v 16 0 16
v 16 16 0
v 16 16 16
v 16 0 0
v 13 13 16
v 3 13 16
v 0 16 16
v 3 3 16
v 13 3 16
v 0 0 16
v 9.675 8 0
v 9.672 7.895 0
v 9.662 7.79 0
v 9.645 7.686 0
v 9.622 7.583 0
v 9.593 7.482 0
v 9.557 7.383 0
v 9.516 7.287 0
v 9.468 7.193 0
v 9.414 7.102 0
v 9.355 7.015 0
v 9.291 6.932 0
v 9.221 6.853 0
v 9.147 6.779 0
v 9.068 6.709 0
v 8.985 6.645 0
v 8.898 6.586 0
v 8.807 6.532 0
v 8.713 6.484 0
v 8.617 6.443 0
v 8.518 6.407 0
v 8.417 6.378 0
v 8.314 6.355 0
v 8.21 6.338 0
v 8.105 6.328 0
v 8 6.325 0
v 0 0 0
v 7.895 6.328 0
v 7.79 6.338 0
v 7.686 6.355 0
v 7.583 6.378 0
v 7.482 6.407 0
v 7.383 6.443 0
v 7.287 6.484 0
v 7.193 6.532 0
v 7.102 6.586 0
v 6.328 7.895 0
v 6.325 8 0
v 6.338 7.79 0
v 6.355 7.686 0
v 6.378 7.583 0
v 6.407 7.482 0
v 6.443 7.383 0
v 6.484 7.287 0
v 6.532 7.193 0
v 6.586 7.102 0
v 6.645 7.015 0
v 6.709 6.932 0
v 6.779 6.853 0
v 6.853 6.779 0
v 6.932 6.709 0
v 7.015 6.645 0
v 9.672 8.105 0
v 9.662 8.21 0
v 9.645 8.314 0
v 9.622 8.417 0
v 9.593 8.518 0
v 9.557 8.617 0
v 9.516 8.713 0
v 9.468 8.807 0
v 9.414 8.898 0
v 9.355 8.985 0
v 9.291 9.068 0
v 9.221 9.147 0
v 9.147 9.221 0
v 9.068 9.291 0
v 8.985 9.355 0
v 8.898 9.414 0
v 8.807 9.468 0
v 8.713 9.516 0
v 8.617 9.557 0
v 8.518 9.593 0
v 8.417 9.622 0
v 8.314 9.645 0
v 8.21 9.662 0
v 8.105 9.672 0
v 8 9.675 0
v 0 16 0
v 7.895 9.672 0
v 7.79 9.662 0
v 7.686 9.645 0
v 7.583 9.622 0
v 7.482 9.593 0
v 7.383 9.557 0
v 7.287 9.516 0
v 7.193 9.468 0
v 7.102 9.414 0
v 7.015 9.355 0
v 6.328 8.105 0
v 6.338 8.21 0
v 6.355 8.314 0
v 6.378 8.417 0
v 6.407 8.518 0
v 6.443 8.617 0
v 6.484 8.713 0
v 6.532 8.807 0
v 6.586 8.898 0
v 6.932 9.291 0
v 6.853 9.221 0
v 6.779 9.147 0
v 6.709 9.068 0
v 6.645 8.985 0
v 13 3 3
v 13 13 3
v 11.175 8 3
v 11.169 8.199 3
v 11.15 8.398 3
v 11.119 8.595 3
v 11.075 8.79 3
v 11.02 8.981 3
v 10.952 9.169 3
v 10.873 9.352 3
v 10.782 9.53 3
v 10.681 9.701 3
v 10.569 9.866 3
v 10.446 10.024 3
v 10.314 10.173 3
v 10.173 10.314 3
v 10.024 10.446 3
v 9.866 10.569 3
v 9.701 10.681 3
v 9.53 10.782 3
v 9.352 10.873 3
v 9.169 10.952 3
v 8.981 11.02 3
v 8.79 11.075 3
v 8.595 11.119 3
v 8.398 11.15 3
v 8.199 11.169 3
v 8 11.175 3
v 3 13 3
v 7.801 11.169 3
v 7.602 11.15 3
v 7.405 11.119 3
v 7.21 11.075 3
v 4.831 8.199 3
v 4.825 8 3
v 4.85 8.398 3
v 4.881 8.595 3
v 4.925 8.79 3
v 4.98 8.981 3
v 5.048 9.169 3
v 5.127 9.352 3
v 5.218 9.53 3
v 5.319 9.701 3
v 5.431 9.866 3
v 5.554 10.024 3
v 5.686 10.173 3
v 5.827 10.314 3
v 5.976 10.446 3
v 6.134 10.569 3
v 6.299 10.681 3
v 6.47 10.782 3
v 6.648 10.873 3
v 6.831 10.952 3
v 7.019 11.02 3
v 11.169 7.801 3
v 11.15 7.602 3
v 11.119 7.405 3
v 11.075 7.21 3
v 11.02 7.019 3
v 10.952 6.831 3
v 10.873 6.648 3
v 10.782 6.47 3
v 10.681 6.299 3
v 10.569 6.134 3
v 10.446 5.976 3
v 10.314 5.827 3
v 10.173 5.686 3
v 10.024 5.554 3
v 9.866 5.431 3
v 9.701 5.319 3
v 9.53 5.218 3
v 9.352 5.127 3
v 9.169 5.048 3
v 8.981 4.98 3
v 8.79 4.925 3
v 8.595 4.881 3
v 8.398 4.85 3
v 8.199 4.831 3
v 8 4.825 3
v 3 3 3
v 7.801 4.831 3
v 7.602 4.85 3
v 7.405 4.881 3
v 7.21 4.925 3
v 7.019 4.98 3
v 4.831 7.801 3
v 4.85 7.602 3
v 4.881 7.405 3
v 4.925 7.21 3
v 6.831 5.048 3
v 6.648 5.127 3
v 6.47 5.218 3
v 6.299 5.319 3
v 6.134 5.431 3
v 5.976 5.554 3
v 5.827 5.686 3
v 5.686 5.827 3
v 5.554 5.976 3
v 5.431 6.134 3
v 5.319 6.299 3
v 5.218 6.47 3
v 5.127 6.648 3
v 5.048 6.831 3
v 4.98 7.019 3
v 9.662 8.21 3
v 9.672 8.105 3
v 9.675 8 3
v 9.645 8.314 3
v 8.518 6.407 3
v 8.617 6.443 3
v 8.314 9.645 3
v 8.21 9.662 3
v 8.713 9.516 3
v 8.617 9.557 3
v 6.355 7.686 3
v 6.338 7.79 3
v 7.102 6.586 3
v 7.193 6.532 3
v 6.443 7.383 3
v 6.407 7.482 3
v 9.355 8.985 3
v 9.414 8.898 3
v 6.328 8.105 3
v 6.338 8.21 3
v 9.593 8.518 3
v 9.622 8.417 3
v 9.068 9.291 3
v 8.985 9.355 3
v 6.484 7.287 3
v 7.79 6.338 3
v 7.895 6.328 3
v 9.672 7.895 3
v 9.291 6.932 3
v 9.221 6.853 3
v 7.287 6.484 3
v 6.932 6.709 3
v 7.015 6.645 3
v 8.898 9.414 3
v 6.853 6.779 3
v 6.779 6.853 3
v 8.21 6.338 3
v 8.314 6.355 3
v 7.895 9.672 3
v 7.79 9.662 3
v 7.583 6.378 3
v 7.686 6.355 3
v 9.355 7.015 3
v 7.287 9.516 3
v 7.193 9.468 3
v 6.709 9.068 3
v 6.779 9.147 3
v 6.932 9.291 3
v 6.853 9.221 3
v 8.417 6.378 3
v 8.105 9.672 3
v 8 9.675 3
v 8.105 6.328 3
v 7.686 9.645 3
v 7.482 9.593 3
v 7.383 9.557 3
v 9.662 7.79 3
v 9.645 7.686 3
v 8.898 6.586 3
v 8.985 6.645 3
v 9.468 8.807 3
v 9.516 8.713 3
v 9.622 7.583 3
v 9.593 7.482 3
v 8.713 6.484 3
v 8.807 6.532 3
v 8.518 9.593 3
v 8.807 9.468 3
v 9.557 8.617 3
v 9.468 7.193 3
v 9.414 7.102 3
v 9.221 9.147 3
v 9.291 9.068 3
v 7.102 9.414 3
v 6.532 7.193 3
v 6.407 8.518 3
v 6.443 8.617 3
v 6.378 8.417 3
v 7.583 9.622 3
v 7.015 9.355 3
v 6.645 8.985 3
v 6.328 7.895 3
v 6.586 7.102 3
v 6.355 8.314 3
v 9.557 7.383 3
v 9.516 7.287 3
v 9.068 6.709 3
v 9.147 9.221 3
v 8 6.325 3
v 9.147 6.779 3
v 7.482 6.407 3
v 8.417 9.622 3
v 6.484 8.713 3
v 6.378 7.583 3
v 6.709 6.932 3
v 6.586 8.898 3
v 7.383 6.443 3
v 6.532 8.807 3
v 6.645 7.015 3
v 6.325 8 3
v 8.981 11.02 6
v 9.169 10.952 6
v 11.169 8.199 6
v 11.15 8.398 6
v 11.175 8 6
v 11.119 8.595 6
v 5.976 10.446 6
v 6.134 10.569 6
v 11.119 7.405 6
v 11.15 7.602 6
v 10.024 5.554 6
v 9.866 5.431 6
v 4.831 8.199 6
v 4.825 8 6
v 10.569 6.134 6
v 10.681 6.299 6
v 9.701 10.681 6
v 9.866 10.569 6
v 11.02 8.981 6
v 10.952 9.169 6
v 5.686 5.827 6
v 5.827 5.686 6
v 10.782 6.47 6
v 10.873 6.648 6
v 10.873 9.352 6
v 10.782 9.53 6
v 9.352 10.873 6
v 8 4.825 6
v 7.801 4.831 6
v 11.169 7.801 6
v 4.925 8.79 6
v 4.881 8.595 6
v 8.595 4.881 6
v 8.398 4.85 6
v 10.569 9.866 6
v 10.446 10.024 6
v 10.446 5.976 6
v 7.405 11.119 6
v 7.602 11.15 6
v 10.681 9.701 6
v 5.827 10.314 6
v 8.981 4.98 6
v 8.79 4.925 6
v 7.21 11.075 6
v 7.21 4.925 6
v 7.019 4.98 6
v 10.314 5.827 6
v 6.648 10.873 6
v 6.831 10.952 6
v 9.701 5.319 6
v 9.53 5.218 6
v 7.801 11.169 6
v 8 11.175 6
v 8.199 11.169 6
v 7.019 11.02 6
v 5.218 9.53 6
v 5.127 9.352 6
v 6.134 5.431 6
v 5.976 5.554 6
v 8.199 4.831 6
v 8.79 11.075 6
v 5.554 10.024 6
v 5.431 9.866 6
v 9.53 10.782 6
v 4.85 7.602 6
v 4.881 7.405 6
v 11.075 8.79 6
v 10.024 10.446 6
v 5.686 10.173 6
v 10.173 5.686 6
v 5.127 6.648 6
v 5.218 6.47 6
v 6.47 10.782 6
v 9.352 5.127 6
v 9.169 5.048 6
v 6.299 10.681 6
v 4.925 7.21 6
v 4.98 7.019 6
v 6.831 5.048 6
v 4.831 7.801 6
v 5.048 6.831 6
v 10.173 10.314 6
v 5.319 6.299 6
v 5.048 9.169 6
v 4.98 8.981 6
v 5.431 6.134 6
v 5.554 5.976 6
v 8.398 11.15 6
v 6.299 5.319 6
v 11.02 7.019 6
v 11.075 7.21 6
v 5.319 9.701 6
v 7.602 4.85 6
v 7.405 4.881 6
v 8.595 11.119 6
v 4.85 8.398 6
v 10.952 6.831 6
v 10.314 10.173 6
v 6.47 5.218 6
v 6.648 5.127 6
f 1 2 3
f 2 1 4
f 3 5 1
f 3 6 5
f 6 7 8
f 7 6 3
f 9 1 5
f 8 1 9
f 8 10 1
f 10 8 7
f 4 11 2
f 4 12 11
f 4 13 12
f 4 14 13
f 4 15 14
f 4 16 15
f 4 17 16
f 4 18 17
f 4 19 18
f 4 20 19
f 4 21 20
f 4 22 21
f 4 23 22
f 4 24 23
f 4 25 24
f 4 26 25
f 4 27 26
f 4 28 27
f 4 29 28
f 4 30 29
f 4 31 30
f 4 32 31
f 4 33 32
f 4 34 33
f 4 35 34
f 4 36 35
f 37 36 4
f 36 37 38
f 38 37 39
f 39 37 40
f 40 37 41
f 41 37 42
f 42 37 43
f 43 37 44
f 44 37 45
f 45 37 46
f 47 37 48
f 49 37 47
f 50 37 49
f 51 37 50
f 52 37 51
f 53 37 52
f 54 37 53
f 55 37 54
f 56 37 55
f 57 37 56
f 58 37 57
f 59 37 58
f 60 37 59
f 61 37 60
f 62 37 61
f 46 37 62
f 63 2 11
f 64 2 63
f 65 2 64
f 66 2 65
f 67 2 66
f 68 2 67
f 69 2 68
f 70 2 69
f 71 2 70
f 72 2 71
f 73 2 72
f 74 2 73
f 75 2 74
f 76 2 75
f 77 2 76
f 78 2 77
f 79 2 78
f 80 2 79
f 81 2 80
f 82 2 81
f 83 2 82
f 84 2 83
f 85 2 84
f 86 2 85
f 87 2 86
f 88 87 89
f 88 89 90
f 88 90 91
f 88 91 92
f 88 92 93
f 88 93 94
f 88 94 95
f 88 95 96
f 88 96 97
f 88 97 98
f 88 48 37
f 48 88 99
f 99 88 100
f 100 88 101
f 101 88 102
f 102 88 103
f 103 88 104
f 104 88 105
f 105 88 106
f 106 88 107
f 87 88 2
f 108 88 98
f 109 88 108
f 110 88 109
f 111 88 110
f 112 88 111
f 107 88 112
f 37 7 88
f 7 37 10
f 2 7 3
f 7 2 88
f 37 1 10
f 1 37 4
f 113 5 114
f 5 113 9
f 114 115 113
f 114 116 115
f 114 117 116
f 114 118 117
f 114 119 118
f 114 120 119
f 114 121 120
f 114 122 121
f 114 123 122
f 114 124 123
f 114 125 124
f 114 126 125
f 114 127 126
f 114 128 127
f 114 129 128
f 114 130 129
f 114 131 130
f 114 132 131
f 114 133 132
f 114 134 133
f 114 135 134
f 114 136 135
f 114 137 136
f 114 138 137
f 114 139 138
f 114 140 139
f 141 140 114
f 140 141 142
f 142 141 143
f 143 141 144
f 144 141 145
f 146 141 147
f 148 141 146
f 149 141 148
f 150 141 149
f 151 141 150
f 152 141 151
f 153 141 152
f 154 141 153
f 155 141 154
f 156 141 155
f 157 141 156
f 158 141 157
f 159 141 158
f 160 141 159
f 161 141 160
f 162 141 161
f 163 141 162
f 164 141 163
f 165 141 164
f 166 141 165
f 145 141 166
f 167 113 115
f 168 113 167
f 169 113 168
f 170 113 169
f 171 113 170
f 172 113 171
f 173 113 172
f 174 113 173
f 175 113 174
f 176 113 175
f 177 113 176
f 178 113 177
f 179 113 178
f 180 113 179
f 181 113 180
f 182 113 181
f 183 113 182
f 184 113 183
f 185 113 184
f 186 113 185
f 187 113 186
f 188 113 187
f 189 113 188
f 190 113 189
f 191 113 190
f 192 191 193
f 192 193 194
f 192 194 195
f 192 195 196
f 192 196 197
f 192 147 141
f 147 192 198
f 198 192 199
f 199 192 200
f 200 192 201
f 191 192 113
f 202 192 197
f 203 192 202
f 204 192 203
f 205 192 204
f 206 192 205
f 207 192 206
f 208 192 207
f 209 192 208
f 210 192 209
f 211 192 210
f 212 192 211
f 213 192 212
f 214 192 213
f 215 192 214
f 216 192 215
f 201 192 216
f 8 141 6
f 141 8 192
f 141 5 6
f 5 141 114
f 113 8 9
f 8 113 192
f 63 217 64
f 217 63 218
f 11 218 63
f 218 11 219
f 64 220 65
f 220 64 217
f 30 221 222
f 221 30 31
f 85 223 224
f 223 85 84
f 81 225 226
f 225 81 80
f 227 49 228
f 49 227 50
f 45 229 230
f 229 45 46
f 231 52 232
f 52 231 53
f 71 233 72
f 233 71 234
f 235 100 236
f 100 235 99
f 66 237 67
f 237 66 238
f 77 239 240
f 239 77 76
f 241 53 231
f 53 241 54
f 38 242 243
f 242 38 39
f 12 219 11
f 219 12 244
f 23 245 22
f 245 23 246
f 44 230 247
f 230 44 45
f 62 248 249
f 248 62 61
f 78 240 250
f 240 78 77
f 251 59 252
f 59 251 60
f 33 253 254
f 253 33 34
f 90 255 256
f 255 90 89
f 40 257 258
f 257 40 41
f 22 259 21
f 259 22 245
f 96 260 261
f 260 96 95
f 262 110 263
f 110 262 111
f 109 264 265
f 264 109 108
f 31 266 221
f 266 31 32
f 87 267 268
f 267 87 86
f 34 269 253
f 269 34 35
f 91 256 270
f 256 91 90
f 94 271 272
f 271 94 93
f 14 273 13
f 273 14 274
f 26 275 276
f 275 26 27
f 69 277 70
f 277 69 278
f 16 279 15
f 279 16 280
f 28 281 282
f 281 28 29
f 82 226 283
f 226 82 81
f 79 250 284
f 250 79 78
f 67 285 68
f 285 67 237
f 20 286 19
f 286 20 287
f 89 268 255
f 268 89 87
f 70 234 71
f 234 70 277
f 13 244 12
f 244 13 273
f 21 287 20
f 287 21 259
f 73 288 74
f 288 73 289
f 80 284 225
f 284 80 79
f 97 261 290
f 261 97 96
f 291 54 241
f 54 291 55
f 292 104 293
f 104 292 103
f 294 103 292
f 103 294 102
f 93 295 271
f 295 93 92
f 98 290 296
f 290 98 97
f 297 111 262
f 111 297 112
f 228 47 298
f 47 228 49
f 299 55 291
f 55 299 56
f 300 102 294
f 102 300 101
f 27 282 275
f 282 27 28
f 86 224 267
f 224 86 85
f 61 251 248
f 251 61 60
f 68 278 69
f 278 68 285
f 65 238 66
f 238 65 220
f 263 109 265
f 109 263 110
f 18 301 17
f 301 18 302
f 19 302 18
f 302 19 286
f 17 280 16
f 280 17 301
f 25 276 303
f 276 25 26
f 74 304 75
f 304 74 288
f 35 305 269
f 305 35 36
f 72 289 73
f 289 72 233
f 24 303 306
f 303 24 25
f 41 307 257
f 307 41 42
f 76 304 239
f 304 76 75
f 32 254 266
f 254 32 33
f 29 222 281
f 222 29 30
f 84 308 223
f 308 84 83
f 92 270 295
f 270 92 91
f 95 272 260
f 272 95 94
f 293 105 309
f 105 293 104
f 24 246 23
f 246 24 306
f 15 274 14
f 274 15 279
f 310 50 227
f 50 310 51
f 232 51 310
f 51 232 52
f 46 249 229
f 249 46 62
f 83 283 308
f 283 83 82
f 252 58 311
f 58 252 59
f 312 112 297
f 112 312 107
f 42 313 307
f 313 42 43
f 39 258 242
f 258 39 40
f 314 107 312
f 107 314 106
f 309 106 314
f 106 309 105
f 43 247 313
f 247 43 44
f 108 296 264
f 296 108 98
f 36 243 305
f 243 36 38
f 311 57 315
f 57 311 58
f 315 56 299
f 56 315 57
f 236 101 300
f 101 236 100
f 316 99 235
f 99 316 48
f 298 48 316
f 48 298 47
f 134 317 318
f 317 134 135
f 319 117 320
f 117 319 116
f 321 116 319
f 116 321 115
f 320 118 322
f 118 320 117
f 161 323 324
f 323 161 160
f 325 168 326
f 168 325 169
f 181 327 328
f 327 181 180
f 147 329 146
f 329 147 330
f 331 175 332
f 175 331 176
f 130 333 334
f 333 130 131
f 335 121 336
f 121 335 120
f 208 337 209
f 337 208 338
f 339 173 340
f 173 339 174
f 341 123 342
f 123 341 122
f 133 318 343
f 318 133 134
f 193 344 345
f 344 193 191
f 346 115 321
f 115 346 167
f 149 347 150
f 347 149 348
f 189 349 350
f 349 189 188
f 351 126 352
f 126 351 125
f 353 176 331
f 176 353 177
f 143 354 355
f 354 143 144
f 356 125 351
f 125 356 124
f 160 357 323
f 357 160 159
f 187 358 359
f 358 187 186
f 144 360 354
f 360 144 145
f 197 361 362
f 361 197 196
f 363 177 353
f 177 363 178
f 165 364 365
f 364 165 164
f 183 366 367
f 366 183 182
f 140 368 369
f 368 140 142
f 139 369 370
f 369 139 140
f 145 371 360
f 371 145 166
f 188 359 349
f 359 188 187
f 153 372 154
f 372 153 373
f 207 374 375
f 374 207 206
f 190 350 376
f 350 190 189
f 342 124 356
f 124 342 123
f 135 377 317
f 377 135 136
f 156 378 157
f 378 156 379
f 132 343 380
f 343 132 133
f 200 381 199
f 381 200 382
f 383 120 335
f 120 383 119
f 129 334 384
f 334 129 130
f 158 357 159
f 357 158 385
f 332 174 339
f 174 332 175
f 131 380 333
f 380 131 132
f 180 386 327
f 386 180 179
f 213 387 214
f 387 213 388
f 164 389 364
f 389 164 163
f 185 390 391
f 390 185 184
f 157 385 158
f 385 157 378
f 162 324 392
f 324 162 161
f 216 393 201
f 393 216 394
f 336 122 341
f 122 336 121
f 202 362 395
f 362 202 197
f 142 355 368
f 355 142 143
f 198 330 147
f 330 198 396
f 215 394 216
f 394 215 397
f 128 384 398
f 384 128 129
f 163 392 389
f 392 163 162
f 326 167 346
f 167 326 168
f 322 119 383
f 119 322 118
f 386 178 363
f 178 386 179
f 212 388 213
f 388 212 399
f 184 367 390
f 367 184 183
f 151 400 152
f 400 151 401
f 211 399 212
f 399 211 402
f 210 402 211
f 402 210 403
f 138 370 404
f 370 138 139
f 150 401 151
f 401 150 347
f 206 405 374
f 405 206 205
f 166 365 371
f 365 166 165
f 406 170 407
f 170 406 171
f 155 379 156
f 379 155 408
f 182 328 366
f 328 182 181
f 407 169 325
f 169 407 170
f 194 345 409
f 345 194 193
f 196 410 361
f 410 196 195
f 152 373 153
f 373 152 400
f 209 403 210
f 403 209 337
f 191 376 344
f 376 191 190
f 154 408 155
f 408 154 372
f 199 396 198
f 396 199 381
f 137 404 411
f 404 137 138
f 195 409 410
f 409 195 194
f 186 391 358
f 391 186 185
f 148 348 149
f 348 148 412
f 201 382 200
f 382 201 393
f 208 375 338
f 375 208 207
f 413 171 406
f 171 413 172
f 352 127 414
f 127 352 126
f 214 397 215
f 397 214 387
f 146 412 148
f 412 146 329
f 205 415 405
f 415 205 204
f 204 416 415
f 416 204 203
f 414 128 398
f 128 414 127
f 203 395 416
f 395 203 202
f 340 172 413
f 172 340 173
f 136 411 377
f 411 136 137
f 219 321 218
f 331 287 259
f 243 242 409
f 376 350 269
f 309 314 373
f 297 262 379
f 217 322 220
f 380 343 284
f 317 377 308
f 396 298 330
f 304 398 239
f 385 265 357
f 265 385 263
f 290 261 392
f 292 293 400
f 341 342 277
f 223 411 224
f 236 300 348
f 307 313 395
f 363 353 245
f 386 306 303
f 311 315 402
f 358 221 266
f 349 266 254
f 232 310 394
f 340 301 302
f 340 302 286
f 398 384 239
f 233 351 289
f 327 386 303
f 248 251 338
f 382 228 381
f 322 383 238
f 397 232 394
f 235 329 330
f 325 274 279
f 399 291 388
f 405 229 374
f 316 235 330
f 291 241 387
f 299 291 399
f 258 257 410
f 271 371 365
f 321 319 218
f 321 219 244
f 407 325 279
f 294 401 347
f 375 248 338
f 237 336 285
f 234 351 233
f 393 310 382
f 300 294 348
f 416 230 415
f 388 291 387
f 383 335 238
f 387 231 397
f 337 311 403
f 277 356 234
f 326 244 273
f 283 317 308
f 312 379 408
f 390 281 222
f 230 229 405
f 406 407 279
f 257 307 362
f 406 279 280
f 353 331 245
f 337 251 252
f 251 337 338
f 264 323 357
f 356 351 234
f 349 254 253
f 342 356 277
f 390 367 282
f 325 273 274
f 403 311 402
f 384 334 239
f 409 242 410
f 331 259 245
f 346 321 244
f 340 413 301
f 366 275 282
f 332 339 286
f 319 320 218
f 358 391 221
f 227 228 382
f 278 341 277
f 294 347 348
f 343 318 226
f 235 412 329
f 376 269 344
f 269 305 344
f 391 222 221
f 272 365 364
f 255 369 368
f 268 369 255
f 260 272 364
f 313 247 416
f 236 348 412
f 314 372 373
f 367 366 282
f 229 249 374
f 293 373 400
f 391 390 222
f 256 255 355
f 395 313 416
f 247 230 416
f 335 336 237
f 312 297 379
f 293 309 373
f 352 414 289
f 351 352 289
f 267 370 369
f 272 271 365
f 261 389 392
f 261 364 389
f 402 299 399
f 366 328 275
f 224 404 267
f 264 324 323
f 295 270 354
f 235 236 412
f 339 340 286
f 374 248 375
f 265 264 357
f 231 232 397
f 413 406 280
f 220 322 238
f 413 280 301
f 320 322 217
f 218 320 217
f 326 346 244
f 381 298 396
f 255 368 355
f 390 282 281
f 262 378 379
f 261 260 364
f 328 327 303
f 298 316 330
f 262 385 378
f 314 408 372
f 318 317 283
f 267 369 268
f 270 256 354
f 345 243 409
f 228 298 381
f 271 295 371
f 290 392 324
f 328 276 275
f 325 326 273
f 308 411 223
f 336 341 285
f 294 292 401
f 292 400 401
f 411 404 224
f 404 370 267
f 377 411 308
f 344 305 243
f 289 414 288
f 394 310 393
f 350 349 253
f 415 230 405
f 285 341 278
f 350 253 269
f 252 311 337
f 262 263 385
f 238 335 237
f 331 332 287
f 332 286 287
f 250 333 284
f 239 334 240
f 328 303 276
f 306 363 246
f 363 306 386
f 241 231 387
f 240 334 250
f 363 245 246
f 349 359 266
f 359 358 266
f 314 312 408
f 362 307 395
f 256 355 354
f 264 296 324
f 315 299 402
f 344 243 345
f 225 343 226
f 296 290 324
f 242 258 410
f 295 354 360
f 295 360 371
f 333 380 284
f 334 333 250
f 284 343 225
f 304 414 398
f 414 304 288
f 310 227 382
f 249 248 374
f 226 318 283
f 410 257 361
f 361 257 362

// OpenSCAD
//Filament Diameter
filament = 2.85; //[0:0.01:10]

//Filament Spacing
filament_space = 0.5; //[0:0.01:10]

filament_d = filament + filament_space;

//Width of the inner Cube
w = 10; //[5:100]
//Height of the inner Cube
h = 30; //[10:100]
//Wall Thickness
wall = 3; //[1:0.1:30]

union() {
    difference() {
        cube(w+wall*2,w+wall*2,h+wall);
        
        translate([wall,wall,wall])
        cube([w,w,h]);
        
        translate([w/2+wall,w/2+wall,0])
        cylinder(d=filament_d,h=wall,$fn=100);
    }
    
    translate([w/2+wall,w/2+wall,wall])
    difference() {
        cylinder(d=filament_d+wall,h=wall,$fn=100);
        cylinder(d1=filament_d,d2=filament_d+wall,h=wall,$fn=100);
    }
}
